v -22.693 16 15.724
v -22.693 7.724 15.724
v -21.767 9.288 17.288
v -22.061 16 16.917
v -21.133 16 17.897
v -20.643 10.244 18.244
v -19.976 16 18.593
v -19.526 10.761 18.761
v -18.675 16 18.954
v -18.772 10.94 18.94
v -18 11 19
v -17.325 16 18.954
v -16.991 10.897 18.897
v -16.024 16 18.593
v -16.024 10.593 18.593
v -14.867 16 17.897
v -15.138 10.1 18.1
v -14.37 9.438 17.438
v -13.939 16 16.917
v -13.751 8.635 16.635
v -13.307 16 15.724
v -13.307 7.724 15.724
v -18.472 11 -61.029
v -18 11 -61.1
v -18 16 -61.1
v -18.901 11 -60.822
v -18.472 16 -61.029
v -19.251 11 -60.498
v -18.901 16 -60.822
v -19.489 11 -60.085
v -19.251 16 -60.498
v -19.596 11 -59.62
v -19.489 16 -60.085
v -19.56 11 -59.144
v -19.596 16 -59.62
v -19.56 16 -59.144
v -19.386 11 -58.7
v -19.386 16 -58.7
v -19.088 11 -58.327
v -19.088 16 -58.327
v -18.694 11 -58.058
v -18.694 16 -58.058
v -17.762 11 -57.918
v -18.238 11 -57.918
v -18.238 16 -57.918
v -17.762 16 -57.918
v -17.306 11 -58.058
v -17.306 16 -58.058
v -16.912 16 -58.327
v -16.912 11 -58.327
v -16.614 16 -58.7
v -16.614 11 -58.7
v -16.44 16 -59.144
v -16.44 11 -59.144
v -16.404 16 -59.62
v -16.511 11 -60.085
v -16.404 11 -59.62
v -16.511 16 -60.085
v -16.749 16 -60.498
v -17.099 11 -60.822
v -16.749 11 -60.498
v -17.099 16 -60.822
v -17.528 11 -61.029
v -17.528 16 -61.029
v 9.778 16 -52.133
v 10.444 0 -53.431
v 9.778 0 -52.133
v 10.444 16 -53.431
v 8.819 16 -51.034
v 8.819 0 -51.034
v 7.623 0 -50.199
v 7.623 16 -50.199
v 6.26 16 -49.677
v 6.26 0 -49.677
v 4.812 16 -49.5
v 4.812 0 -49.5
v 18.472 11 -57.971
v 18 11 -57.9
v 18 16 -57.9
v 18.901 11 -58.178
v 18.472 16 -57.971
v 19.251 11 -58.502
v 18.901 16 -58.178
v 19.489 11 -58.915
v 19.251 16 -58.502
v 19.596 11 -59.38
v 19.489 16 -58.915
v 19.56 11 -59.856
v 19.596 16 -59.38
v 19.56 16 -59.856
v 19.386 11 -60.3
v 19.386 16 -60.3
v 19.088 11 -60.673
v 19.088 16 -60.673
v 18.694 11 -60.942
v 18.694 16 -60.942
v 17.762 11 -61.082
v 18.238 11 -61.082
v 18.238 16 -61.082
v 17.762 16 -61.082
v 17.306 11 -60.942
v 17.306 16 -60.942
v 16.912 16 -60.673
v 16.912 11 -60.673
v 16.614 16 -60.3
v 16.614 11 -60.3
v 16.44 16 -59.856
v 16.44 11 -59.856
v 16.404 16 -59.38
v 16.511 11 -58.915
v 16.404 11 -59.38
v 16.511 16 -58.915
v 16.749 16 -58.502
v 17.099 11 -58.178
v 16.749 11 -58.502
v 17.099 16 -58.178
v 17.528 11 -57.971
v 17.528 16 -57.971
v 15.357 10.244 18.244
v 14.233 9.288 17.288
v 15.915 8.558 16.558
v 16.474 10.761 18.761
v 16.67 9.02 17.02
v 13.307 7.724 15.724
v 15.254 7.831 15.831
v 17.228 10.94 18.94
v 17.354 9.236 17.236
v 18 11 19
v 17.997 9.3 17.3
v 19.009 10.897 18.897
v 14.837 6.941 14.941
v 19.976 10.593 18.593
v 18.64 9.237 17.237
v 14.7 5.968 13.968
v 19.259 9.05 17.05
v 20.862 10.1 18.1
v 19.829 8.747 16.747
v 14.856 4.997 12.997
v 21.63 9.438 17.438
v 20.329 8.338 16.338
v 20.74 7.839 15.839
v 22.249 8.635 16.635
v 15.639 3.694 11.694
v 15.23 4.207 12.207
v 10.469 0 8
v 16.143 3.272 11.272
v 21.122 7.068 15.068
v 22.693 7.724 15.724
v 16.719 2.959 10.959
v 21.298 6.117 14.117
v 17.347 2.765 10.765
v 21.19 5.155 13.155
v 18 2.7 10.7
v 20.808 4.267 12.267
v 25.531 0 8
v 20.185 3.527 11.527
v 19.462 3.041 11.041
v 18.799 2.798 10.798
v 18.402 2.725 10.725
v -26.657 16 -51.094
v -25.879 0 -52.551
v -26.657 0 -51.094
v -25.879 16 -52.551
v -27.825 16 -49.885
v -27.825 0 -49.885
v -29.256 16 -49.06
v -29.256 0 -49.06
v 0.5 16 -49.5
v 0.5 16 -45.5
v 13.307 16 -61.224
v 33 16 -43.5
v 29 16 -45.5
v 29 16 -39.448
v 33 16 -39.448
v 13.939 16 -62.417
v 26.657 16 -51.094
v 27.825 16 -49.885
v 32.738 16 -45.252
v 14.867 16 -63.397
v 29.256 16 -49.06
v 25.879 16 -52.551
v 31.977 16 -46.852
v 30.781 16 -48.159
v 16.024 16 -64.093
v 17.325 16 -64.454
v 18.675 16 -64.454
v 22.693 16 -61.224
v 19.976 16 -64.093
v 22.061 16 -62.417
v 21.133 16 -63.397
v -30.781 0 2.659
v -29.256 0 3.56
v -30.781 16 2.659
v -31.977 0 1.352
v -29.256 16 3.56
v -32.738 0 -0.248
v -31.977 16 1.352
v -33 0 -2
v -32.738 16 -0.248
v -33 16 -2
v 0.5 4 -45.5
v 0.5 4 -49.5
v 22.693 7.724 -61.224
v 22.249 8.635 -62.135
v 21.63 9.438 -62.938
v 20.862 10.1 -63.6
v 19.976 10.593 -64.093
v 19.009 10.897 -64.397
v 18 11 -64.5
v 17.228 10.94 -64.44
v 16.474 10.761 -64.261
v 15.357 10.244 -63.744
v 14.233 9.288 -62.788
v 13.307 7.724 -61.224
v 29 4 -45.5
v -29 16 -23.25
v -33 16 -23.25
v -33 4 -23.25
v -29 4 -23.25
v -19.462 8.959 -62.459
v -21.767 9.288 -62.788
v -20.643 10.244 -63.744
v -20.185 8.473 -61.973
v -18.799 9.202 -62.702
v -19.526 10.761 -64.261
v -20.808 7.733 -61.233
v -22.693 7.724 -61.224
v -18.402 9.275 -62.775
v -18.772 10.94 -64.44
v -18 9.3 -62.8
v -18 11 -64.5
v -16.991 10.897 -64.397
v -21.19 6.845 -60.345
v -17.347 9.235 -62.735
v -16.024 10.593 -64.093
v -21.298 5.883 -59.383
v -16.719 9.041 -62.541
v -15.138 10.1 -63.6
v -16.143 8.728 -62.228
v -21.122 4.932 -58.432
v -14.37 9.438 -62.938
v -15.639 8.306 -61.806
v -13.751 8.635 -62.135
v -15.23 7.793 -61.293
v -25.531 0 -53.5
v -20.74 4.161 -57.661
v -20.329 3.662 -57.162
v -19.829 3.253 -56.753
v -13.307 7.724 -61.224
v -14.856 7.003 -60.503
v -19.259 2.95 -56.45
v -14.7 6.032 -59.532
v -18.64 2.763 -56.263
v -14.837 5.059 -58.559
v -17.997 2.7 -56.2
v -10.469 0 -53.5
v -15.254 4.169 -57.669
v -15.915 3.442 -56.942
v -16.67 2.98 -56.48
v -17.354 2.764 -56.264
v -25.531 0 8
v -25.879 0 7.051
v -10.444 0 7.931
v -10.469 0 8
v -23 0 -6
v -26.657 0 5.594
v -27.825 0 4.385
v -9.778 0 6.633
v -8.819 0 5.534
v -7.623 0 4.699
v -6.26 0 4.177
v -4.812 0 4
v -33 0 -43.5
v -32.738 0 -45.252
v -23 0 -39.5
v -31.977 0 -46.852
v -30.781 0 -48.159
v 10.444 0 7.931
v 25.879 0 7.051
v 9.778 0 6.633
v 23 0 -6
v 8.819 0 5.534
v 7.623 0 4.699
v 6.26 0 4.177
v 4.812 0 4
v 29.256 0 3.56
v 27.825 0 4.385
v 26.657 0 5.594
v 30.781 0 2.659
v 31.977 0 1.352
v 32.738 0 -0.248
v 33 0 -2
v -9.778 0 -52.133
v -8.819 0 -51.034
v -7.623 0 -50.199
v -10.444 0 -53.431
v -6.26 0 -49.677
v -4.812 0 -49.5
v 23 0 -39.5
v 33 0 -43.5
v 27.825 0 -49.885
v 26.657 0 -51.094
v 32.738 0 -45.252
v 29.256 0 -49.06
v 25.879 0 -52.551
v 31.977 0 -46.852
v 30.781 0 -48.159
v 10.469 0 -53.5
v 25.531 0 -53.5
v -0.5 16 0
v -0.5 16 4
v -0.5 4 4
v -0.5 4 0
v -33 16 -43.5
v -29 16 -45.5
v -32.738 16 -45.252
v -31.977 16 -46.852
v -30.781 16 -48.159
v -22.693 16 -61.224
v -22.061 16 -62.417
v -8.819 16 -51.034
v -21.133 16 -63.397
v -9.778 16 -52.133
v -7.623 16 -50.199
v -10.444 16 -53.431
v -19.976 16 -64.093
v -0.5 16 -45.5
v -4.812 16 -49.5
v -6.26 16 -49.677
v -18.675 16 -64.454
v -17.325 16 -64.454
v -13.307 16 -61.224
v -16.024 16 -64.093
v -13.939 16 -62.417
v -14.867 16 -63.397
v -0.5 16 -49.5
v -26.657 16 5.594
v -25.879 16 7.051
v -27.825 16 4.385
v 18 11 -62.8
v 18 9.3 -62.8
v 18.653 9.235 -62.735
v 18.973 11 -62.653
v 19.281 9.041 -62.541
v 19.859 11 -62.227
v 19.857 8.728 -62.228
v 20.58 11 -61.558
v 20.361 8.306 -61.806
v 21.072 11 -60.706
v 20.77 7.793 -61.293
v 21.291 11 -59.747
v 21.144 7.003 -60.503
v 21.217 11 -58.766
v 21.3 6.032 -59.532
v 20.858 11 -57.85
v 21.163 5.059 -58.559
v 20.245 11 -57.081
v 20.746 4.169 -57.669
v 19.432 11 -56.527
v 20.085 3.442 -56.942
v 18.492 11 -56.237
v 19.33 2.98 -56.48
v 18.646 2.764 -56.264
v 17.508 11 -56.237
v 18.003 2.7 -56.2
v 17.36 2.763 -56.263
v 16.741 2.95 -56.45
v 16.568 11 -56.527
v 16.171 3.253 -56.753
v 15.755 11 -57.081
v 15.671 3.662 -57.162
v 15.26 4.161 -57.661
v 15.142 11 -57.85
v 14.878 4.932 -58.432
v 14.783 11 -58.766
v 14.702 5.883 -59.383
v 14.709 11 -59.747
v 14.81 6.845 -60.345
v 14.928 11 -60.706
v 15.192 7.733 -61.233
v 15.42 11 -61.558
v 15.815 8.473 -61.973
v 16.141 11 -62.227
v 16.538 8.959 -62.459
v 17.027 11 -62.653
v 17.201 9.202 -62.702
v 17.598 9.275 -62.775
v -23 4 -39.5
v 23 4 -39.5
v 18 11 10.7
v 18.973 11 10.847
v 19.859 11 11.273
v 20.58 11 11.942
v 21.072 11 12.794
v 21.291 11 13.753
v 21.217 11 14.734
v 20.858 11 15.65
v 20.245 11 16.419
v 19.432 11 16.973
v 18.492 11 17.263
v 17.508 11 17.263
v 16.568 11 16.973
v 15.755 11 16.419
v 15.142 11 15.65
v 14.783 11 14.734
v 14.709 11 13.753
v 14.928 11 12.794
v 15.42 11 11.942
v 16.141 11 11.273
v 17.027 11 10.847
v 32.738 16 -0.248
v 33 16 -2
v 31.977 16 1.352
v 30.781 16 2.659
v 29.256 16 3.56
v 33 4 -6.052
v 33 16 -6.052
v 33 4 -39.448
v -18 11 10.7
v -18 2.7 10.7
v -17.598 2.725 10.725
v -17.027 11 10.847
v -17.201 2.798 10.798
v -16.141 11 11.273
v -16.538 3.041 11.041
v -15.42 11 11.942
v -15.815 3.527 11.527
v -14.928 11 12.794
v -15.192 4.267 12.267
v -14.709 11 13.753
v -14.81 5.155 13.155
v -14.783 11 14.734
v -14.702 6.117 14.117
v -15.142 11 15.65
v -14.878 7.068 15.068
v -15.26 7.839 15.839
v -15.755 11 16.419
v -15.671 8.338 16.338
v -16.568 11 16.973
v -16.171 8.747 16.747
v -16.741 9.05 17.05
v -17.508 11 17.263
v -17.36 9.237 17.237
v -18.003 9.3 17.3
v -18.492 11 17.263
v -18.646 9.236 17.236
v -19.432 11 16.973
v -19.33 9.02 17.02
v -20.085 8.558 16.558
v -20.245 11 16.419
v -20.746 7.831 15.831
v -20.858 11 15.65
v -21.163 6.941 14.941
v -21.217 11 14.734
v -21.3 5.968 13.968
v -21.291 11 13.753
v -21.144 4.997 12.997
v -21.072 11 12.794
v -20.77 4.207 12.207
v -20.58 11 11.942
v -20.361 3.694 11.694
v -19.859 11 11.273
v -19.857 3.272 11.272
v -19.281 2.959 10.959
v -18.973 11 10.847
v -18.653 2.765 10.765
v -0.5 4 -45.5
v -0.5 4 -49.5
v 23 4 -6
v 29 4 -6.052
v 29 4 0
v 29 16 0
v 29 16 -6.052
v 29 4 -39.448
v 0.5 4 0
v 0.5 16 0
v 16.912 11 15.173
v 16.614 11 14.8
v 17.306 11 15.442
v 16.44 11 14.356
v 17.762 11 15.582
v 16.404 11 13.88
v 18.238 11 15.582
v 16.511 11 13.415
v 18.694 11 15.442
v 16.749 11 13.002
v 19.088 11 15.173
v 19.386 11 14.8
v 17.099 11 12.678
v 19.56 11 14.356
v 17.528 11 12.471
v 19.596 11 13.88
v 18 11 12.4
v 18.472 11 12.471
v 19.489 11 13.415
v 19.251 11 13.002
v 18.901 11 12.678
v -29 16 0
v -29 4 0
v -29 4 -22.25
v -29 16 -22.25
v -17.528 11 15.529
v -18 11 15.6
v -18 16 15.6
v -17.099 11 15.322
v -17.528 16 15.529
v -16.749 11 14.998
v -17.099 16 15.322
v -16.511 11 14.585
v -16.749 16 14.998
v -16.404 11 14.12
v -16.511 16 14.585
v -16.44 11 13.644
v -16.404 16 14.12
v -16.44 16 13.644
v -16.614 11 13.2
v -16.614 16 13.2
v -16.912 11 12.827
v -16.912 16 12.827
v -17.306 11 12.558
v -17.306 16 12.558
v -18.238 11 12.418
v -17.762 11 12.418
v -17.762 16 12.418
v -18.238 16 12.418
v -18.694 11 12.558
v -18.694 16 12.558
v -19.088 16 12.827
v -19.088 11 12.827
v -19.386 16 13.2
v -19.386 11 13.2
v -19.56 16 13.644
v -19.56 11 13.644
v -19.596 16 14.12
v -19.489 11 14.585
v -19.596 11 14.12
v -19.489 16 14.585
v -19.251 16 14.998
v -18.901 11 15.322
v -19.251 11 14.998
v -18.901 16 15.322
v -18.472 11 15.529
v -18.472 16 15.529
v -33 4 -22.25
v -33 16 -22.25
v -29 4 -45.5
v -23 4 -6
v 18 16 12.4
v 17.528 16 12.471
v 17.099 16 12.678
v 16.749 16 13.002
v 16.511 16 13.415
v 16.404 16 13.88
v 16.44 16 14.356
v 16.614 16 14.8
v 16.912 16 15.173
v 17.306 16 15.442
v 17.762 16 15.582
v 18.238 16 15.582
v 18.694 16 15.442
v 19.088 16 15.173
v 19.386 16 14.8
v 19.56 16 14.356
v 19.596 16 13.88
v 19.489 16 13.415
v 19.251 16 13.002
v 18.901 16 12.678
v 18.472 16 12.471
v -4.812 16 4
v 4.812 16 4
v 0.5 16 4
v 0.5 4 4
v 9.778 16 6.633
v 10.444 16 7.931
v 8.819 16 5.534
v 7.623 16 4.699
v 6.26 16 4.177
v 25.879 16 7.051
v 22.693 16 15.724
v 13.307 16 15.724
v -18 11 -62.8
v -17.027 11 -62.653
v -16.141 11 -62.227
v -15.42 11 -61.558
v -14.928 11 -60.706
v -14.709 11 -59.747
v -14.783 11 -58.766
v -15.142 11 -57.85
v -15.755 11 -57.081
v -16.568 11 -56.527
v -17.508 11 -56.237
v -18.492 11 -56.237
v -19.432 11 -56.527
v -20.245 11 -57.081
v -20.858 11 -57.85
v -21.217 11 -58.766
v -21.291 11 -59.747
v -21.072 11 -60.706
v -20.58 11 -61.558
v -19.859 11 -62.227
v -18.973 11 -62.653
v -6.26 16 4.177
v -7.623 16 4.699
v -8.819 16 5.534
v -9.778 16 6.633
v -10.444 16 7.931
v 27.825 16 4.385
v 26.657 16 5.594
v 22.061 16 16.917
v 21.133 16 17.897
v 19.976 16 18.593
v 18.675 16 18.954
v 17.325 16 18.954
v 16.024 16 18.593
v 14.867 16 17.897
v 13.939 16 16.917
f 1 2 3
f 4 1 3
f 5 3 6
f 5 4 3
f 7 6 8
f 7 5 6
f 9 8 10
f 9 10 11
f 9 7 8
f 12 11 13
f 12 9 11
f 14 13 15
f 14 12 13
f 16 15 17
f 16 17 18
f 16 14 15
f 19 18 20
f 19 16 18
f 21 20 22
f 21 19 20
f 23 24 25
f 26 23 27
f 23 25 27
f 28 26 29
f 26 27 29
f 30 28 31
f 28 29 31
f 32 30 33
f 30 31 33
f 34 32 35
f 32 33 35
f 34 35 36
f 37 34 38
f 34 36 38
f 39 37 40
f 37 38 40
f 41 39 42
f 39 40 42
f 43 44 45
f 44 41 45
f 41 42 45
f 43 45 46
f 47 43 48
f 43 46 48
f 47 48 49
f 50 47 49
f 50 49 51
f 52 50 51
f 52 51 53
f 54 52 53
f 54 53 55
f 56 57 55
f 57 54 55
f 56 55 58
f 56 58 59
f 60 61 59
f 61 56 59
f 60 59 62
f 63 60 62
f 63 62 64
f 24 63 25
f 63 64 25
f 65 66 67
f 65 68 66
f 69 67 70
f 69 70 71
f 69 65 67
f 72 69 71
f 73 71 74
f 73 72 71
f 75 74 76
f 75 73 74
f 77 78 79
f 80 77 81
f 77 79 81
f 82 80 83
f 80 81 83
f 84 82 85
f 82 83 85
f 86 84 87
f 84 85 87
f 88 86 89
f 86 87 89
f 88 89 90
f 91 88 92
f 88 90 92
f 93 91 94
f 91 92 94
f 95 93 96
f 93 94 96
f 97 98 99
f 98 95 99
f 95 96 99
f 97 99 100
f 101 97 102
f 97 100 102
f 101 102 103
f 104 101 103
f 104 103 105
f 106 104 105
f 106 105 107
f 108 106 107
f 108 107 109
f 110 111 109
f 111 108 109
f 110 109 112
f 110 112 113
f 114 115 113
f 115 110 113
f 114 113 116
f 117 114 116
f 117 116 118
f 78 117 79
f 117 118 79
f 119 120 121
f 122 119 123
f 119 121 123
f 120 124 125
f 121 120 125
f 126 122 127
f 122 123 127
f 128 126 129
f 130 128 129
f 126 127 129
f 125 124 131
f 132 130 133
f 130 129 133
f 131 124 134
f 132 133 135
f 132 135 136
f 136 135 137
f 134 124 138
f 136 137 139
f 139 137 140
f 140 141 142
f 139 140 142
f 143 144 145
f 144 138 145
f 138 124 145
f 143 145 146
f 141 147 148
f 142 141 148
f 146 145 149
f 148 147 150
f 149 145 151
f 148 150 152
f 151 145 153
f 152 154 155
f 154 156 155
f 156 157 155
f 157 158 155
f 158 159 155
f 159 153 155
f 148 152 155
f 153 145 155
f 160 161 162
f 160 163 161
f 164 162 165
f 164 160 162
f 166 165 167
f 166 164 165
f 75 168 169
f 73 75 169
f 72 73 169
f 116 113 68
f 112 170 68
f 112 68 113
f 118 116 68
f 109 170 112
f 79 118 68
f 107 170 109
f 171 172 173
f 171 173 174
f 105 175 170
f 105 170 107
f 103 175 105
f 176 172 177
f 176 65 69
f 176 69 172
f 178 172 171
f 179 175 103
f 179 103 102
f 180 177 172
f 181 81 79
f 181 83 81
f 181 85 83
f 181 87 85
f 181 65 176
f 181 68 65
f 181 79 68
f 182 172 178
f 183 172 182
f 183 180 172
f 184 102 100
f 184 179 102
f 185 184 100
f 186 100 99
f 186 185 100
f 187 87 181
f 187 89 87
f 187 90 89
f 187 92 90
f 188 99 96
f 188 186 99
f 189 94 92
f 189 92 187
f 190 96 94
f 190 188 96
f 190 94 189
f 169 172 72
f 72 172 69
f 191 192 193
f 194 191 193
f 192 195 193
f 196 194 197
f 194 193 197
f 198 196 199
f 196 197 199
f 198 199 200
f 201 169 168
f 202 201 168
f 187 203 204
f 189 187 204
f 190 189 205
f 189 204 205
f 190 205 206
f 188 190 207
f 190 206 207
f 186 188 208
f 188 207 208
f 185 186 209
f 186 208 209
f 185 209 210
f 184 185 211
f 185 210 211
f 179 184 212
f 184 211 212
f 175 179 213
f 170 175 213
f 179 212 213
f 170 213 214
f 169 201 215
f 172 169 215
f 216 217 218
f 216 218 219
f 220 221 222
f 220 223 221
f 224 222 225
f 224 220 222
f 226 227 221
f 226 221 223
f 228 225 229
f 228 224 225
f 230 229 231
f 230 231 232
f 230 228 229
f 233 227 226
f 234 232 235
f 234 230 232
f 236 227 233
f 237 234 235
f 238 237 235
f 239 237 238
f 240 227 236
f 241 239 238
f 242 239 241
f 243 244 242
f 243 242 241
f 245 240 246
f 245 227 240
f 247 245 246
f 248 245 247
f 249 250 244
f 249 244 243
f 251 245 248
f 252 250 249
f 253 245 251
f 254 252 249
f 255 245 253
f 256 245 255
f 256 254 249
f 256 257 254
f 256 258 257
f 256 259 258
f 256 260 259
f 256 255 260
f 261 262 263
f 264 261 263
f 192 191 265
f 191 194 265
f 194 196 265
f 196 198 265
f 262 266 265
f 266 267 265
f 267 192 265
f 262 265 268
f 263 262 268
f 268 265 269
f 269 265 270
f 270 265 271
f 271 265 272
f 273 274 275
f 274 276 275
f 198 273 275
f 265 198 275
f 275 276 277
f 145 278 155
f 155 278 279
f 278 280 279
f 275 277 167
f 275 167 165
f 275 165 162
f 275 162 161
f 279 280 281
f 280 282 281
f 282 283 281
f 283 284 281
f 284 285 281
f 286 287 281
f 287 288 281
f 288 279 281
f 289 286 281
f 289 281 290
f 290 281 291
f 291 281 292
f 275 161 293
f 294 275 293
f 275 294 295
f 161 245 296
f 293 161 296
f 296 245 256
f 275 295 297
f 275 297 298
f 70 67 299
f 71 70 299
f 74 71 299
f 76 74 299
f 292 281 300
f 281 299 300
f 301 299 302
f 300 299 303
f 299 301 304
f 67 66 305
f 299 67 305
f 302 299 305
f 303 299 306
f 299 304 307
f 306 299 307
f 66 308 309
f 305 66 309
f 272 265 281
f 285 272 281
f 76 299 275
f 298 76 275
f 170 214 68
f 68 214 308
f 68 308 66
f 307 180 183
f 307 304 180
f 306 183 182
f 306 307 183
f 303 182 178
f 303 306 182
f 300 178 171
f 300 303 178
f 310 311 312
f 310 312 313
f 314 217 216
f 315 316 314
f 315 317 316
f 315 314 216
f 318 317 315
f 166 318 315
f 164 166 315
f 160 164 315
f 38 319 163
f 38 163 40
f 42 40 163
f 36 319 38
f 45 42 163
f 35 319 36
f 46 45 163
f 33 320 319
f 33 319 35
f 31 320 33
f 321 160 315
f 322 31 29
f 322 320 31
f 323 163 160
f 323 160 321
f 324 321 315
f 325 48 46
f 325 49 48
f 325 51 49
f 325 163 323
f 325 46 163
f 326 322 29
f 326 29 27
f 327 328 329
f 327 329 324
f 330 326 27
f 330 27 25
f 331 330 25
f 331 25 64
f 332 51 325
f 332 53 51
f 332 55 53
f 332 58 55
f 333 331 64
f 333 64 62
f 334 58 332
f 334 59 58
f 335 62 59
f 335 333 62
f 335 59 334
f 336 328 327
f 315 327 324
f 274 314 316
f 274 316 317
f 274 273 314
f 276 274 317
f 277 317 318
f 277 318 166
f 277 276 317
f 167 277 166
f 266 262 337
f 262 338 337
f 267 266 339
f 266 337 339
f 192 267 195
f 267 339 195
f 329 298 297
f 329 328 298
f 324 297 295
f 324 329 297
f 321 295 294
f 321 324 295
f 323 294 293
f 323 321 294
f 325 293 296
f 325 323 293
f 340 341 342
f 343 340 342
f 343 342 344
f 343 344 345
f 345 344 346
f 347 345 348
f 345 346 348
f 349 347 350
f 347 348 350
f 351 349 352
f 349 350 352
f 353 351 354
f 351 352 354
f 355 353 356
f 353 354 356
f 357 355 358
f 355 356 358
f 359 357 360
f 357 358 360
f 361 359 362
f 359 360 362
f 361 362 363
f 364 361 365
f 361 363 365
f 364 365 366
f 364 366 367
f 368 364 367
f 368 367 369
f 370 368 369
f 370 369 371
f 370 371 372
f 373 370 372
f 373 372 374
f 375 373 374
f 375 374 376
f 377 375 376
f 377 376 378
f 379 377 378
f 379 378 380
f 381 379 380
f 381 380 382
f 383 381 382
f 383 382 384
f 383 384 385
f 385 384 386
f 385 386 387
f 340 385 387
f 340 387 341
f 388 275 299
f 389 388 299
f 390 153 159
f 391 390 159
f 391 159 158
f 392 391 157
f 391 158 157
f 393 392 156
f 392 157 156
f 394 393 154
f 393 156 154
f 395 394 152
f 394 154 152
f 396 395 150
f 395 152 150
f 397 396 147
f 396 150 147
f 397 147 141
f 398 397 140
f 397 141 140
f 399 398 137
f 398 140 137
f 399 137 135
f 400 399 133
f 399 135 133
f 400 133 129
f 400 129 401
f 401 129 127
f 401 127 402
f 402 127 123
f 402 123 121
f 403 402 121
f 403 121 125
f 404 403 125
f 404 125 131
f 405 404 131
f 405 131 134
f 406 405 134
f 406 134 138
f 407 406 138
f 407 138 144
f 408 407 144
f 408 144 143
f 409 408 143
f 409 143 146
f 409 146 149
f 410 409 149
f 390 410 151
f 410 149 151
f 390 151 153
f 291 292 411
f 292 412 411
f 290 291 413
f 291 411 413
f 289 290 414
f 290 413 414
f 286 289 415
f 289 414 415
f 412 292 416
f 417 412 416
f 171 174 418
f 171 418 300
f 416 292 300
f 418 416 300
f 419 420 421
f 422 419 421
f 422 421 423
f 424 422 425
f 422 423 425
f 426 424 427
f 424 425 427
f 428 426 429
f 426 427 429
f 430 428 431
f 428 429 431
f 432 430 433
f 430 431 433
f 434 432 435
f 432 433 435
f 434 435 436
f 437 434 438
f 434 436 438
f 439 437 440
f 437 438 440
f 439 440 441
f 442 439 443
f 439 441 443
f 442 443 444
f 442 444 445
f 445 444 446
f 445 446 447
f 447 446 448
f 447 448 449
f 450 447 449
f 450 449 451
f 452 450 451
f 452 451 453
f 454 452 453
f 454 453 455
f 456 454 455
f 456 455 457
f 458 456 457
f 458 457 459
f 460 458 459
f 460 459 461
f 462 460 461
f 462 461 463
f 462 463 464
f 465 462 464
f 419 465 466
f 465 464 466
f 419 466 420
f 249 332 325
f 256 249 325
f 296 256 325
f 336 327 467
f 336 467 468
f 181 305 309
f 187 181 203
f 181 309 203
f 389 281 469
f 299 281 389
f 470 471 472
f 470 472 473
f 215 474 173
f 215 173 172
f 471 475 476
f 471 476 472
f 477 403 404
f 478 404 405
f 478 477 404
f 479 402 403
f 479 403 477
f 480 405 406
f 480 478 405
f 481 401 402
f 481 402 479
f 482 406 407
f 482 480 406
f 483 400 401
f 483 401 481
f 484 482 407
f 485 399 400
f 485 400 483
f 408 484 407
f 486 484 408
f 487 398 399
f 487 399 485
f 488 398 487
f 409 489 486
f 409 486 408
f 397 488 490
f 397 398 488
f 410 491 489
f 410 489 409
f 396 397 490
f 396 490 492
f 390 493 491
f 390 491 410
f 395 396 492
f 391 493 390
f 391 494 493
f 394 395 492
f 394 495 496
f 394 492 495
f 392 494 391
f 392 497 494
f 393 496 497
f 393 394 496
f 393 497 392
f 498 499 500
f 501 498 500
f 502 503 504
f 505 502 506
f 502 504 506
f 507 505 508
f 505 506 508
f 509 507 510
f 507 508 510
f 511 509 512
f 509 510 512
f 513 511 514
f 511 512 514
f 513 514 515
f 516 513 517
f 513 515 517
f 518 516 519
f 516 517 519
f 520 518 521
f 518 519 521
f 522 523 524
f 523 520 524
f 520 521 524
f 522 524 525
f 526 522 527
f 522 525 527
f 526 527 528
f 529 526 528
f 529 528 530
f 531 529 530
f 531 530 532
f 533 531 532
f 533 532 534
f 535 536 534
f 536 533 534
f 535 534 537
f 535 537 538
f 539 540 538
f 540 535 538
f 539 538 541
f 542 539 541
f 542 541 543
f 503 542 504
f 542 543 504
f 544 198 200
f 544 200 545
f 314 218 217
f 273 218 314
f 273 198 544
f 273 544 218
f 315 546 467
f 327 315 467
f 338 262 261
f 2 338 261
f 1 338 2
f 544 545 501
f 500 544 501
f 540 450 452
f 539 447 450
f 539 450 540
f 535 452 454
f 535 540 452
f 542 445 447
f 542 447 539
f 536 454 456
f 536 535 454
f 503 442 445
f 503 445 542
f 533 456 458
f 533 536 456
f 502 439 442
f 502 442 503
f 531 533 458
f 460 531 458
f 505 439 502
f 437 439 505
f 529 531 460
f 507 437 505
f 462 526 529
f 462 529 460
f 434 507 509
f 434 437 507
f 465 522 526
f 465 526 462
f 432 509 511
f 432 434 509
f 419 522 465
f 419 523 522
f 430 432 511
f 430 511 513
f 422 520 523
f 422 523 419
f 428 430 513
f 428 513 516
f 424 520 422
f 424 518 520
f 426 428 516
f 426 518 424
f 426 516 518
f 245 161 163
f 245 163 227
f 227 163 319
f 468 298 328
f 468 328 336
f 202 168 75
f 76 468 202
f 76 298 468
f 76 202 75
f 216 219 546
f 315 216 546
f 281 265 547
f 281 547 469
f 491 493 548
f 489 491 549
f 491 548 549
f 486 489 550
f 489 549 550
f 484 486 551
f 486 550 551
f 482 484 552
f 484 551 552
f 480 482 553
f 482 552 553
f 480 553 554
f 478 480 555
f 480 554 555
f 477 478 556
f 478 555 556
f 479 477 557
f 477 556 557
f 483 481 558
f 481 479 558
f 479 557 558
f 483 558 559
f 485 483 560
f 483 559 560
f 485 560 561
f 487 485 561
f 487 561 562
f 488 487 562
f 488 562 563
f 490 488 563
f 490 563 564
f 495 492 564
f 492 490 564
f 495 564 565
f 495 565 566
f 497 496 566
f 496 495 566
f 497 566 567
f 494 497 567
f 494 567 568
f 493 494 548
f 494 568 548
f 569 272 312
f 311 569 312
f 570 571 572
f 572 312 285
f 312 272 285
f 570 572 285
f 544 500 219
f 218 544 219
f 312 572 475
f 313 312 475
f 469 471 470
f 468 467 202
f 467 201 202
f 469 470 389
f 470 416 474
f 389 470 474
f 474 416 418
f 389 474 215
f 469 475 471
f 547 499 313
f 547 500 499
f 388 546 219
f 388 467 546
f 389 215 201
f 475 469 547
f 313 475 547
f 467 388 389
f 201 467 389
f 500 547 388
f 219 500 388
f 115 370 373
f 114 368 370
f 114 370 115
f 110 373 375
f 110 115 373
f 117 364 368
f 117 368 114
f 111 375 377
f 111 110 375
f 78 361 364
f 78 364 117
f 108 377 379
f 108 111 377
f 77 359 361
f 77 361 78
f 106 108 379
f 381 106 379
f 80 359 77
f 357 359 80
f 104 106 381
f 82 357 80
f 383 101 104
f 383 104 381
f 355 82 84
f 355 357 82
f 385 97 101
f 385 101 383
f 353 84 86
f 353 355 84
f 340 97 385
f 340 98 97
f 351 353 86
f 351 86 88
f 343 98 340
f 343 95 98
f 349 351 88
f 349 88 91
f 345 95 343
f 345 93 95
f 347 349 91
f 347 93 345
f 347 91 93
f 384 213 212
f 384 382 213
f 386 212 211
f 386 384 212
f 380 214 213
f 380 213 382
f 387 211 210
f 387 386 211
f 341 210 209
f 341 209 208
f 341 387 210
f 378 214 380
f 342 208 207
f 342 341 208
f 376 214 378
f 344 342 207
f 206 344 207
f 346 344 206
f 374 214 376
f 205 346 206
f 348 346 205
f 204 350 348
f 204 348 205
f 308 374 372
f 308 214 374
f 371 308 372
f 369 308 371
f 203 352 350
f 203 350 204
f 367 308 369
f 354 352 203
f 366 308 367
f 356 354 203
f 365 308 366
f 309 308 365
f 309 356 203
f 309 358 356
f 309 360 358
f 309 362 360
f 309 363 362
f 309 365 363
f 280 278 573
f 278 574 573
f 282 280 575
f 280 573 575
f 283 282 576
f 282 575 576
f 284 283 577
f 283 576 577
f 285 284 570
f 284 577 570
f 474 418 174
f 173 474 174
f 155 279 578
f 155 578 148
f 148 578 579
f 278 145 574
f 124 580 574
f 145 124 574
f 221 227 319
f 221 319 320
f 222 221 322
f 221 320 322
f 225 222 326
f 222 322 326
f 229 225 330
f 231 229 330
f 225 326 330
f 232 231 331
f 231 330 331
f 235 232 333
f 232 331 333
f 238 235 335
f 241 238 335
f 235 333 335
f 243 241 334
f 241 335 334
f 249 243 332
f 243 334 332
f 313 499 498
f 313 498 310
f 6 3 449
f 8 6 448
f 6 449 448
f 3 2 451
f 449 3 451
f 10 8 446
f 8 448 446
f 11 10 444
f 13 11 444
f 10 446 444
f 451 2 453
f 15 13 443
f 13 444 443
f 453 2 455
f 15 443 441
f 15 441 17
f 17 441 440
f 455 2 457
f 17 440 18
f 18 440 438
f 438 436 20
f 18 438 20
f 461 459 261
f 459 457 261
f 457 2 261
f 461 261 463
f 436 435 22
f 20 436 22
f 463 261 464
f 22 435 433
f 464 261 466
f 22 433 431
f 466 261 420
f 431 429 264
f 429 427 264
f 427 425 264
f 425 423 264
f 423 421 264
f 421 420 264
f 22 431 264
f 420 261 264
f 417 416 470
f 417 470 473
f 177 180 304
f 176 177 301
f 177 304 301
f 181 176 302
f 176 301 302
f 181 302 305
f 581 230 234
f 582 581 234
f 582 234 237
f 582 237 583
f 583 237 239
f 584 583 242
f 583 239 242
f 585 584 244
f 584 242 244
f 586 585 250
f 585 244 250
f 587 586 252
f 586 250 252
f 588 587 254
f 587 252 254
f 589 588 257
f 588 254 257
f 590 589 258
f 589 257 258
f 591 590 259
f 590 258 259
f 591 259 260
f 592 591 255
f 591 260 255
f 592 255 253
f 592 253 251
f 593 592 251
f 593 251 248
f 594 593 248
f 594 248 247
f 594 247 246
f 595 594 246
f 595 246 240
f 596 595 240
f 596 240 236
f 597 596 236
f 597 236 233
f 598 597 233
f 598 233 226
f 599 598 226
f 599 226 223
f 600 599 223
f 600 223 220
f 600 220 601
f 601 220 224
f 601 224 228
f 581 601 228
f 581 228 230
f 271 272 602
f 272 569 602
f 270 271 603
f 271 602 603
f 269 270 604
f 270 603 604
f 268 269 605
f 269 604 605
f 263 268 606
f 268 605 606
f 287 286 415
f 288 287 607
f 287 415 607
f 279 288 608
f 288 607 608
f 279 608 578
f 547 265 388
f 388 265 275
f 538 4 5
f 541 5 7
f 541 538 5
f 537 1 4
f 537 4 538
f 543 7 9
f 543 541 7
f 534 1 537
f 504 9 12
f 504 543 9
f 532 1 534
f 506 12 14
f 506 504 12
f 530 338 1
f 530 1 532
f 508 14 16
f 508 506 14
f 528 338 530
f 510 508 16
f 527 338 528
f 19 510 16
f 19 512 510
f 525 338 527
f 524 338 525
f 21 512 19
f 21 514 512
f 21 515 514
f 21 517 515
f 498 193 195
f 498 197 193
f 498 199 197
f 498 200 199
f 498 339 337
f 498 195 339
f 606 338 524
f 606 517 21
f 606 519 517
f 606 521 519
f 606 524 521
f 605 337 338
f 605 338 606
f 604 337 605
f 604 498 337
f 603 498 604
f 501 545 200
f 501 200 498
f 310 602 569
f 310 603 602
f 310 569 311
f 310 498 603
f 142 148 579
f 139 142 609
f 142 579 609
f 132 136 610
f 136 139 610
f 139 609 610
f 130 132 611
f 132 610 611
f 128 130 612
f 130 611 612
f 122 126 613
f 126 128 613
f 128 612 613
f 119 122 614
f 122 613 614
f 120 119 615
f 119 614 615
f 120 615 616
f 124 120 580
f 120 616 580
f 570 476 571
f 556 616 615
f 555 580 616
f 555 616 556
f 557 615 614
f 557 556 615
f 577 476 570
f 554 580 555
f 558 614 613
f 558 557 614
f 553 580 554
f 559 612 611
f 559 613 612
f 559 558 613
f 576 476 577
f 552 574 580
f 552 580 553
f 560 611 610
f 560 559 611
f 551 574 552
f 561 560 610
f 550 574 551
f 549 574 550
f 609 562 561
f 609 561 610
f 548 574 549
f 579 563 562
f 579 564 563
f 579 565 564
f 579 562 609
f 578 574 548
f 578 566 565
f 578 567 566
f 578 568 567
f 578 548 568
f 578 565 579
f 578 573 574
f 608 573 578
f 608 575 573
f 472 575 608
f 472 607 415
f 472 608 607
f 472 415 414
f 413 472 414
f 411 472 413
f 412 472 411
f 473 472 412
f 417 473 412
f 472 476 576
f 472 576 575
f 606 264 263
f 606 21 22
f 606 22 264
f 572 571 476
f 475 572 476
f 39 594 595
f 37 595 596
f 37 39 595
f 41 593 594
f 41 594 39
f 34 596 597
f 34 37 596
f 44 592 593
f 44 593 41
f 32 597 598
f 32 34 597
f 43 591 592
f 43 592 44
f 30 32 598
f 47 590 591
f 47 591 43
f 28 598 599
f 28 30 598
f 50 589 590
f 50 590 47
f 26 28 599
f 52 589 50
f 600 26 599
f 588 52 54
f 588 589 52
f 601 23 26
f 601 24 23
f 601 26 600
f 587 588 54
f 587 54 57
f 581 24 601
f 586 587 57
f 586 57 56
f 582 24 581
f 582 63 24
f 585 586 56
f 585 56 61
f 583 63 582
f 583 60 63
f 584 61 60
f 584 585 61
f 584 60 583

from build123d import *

# Parameters (mm, degrees)
SKETCH_1_W            = 66
SKETCH_1_H            = 53.5
SKETCH_1_W_2          = 58
SKETCH_1_H_2          = 45.5
SKETCH_1_W_3          = 46
SKETCH_1_H_3          = 33.5
EXTRUDE_1_DEPTH       = 4
EXTRUDE_START         = 4
SKETCH_1_4_W          = 66
SKETCH_1_4_H          = 53.5
SKETCH_1_4_W_2        = 58
SKETCH_1_4_H_2        = 45.5
EXTRUDE_2_DEPTH       = 12
SKETCH_2_R            = 1.6
EXTRUDE_3_DEPTH       = 5
CHAMFER_1_OUTLINE_R   = 1.6
CHAMFER_1_DEPTH       = 11
CHAMFER_START         = -14
CHAMFER_1_2_OUTLINE_W = 54
CHAMFER_1_2_OUTLINE_H = 60.830212793
CHAMFER_1_2_DEPTH     = 8.343145751
CHAMFER_START_2       = 35.001785669
CHAMFER_1_3_OUTLINE_W = 54
CHAMFER_1_3_OUTLINE_H = 8.169787207
CHAMFER_1_3_DEPTH     = 18.384776311
SKETCH_4_R            = 3.3
CUT_EXTRUDE_1_DEPTH   = 11
SKETCH_5_W            = 1
SKETCH_5_H            = 4
SKETCH_5_W_2          = 4
SKETCH_5_H_2          = 1
CUT_EXTRUDE_1_2_DEPTH = 12
FILLET_1_R            = 6
FILLET_2_R            = 6
SKETCH_6_W            = 33.396299262
SKETCH_6_H            = 12
CUT_EXTRUDE_2_DEPTH   = 8


with BuildPart() as part:
    # 草图1 → 凸台-拉伸1 (new body)
    # profile 1 of 2: a face of its own
    with BuildSketch(Plane(origin=(0, 0, 0), x_dir=(1, 0, 0), z_dir=(0, 1, 0))):
        with Locations((0, 22.75)):
            Rectangle(SKETCH_1_W, SKETCH_1_H)
        with Locations((0, 22.75)):
            Rectangle(SKETCH_1_W_2, SKETCH_1_H_2, mode=Mode.SUBTRACT)
    # profile 2 of 2: a face of its own
    with BuildSketch(Plane(origin=(0, 0, 0), x_dir=(1, 0, 0), z_dir=(0, 1, 0))):
        with Locations((0, 22.75)):
            Rectangle(SKETCH_1_W_2, SKETCH_1_H_2)
        with Locations((0, 22.75)):
            Rectangle(SKETCH_1_W_3, SKETCH_1_H_3, mode=Mode.SUBTRACT)
    extrude(amount=EXTRUDE_1_DEPTH)

    # 草图1<4> → 凸台-拉伸2 (add)
    with BuildSketch(Plane(origin=(0, 0, 0), x_dir=(1, 0, 0), z_dir=(0, 1, 0)).offset(EXTRUDE_START)):
        with Locations((0, 22.75)):
            Rectangle(SKETCH_1_4_W, SKETCH_1_4_H)
        with Locations((0, 22.75)):
            Rectangle(SKETCH_1_4_W_2, SKETCH_1_4_H_2, mode=Mode.SUBTRACT)
    extrude(amount=EXTRUDE_2_DEPTH)

    # 草图2 → 凸台-拉伸3 (add)
    # profile 1 of 4: a face of its own
    with BuildSketch(Plane(origin=(0, 16, 0), x_dir=(1, 0, 0), z_dir=(0, 1, 0))):
        with BuildLine():
            Line((13.30663094, 61.224032154), (9, 49.5))
            Line((9, 49.5), (27, 49.5))
            Line((27, 49.5), (22.69336906, 61.224032154))
            ThreePointArc((22.69336906, 61.224032154), (18, 64.5), (13.30663094, 61.224032154))
        make_face()
        with Locations(Location((18, 59.5, 0), (0, 0, 270))):
            Circle(SKETCH_2_R, mode=Mode.SUBTRACT)
    # profile 2 of 4: a face of its own
    with BuildSketch(Plane(origin=(0, 16, 0), x_dir=(1, 0, 0), z_dir=(0, 1, 0))):
        with BuildLine():
            Line((-27, 49.5), (-22.69336906, 61.224032154))
            ThreePointArc((-22.69336906, 61.224032154), (-18, 64.5), (-13.30663094, 61.224032154))
            Line((-13.30663094, 61.224032154), (-9, 49.5))
            Line((-9, 49.5), (-27, 49.5))
        make_face()
        with Locations(Location((-18, 59.5, 0), (0, 0, 90))):
            Circle(SKETCH_2_R, mode=Mode.SUBTRACT)
    # profile 3 of 4: a face of its own
    with BuildSketch(Plane(origin=(0, 16, 0), x_dir=(1, 0, 0), z_dir=(0, 1, 0))):
        with BuildLine():
            Line((-13.30663094, -15.724032154), (-9, -4))
            Line((-9, -4), (-27, -4))
            Line((-27, -4), (-22.69336906, -15.724032154))
            ThreePointArc((-22.69336906, -15.724032154), (-18, -19), (-13.30663094, -15.724032154))
        make_face()
        with Locations(Location((-18, -14, 0), (0, 0, 270))):
            Circle(SKETCH_2_R, mode=Mode.SUBTRACT)
    # profile 4 of 4: a face of its own
    with BuildSketch(Plane(origin=(0, 16, 0), x_dir=(1, 0, 0), z_dir=(0, 1, 0))):
        with BuildLine():
            Line((27, -4), (22.69336906, -15.724032154))
            ThreePointArc((22.69336906, -15.724032154), (18, -19), (13.30663094, -15.724032154))
            Line((13.30663094, -15.724032154), (9, -4))
            Line((9, -4), (27, -4))
        make_face()
        with Locations(Location((18, -14, 0), (0, 0, 90))):
            Circle(SKETCH_2_R, mode=Mode.SUBTRACT)
    extrude(amount=-EXTRUDE_3_DEPTH)

    # 倒角1: read off the stored shape, not the designer's step
    # 倒角1 outline → 倒角1 (add)
    # profile 1 of 4: a face of its own
    with BuildSketch(Plane(origin=(0, 0, 0), x_dir=(1, 0, 0), z_dir=(0, 1, 0))):
        with BuildLine():
            Line((9, 49.5), (27, 49.5))
            Line((27, 49.5), (22.69336906, 61.224032154))
            ThreePointArc((22.69336906, 61.224032154), (18, 64.5), (13.30663094, 61.224032154))
            Line((13.30663094, 61.224032154), (9, 49.5))
        make_face()
        with Locations((18, 59.5)):
            Circle(CHAMFER_1_OUTLINE_R, mode=Mode.SUBTRACT)
    # profile 2 of 4: a face of its own
    with BuildSketch(Plane(origin=(0, 0, 0), x_dir=(1, 0, 0), z_dir=(0, 1, 0))):
        with BuildLine():
            Line((-27, 49.5), (-9, 49.5))
            Line((-9, 49.5), (-13.30663094, 61.224032154))
            ThreePointArc((-13.30663094, 61.224032154), (-18, 64.5), (-22.69336906, 61.224032154))
            Line((-22.69336906, 61.224032154), (-27, 49.5))
        make_face()
        with Locations((-18, 59.5)):
            Circle(CHAMFER_1_OUTLINE_R, mode=Mode.SUBTRACT)
    # profile 3 of 4: a face of its own
    with BuildSketch(Plane(origin=(0, 0, 0), x_dir=(1, 0, 0), z_dir=(0, 1, 0))):
        with BuildLine():
            Line((-27, -4), (-22.69336906, -15.724032154))
            ThreePointArc((-22.69336906, -15.724032154), (-18, -19), (-13.30663094, -15.724032154))
            Line((-13.30663094, -15.724032154), (-9, -4))
            Line((-9, -4), (-27, -4))
        make_face()
        with Locations((-18, -14)):
            Circle(CHAMFER_1_OUTLINE_R, mode=Mode.SUBTRACT)
    # profile 4 of 4: a face of its own
    with BuildSketch(Plane(origin=(0, 0, 0), x_dir=(1, 0, 0), z_dir=(0, 1, 0))):
        with BuildLine():
            Line((27, -4), (9, -4))
            Line((9, -4), (13.30663094, -15.724032154))
            ThreePointArc((13.30663094, -15.724032154), (18, -19), (22.69336906, -15.724032154))
            Line((22.69336906, -15.724032154), (27, -4))
        make_face()
        with Locations((18, -14)):
            Circle(CHAMFER_1_OUTLINE_R, mode=Mode.SUBTRACT)
    extrude(amount=CHAMFER_1_DEPTH)

    # Chamfer 1 2 outline → Chamfer 1 2 (cut)
    with BuildSketch(Plane(origin=(0, 0, 0), x_dir=(1, 0, 0), z_dir=(0, 0.707106781186544, -0.707106781186551)).offset(CHAMFER_START)):
        with Locations((0, 7.415106397)):
            Rectangle(CHAMFER_1_2_OUTLINE_W, CHAMFER_1_2_OUTLINE_H)
    extrude(amount=CHAMFER_1_2_DEPTH, mode=Mode.SUBTRACT)

    # Chamfer 1 3 outline → Chamfer 1 3 (cut)
    with BuildSketch(Plane(origin=(0, 0, 0), x_dir=(1, 0, 0), z_dir=(0, 0.707106781186544, -0.707106781186551)).offset(CHAMFER_START_2)):
        with Locations((0, 41.915106397)):
            Rectangle(CHAMFER_1_3_OUTLINE_W, CHAMFER_1_3_OUTLINE_H)
    extrude(amount=CHAMFER_1_3_DEPTH, mode=Mode.SUBTRACT)

    # 草图4 → Cut-Extrude 1 (cut)
    with BuildSketch(Plane.XZ):
        with Locations(Location((-18, 14, 0), (0, 0, 270))):
            Circle(SKETCH_4_R)
        with Locations(Location((18, 14, 0), (0, 0, 270))):
            Circle(SKETCH_4_R)
        with Locations(Location((18, -59.5, 0), (0, 0, 270))):
            Circle(SKETCH_4_R)
        with Locations(Location((-18, -59.5, 0), (0, 0, 270))):
            Circle(SKETCH_4_R)
    extrude(amount=-CUT_EXTRUDE_1_DEPTH, mode=Mode.SUBTRACT)

    # 草图5 → Cut-Extrude 1 2 (cut)
    with BuildSketch(Plane(origin=(0, 16, 0), x_dir=(1, 0, 0), z_dir=(0, 1, 0))):
        with Locations((0, 47.5)):
            Rectangle(SKETCH_5_W, SKETCH_5_H)
        with Locations((31, 22.75)):
            Rectangle(SKETCH_5_W_2, SKETCH_5_H_2)
        with Locations((0, -2)):
            Rectangle(SKETCH_5_W, SKETCH_5_H)
        with Locations((-31, 22.75)):
            Rectangle(SKETCH_5_W_2, SKETCH_5_H_2)
    extrude(amount=-CUT_EXTRUDE_1_2_DEPTH, mode=Mode.SUBTRACT)

    # 圆角1
    fillet_1_edges = [part.edges().sort_by_distance(p)[0] for p in [
        (-33, 8, -49.5),
        (-33, 8, 4),
        (33, 8, -49.5),
        (33, 8, 4),
    ]]
    fillet(fillet_1_edges, radius=FILLET_1_R - 0.0001)  # a hair under: the kernel refuses the full size

    # 圆角2
    fillet_2_edges = [part.edges().sort_by_distance(p)[0] for p in [
        (27, 5.5, -49.5),
        (9, 5.5, -49.5),
        (-9, 5.5, -49.5),
        (-27, 5.5, -49.5),
        (-27, 5.5, 4),
        (-9, 5.5, 4),
        (9, 5.5, 4),
        (27, 5.5, 4),
    ]]
    fillet(fillet_2_edges, radius=FILLET_2_R)

    # 草图6 → 切除-拉伸2 (cut)
    with BuildSketch(Plane(origin=(33, 0, 0), x_dir=(0, 0, -1), z_dir=(1, 0, 0))):
        with Locations((22.75, 10)):
            Rectangle(SKETCH_6_W, SKETCH_6_H)
    extrude(amount=-CUT_EXTRUDE_2_DEPTH, mode=Mode.SUBTRACT)


solid = part.part
